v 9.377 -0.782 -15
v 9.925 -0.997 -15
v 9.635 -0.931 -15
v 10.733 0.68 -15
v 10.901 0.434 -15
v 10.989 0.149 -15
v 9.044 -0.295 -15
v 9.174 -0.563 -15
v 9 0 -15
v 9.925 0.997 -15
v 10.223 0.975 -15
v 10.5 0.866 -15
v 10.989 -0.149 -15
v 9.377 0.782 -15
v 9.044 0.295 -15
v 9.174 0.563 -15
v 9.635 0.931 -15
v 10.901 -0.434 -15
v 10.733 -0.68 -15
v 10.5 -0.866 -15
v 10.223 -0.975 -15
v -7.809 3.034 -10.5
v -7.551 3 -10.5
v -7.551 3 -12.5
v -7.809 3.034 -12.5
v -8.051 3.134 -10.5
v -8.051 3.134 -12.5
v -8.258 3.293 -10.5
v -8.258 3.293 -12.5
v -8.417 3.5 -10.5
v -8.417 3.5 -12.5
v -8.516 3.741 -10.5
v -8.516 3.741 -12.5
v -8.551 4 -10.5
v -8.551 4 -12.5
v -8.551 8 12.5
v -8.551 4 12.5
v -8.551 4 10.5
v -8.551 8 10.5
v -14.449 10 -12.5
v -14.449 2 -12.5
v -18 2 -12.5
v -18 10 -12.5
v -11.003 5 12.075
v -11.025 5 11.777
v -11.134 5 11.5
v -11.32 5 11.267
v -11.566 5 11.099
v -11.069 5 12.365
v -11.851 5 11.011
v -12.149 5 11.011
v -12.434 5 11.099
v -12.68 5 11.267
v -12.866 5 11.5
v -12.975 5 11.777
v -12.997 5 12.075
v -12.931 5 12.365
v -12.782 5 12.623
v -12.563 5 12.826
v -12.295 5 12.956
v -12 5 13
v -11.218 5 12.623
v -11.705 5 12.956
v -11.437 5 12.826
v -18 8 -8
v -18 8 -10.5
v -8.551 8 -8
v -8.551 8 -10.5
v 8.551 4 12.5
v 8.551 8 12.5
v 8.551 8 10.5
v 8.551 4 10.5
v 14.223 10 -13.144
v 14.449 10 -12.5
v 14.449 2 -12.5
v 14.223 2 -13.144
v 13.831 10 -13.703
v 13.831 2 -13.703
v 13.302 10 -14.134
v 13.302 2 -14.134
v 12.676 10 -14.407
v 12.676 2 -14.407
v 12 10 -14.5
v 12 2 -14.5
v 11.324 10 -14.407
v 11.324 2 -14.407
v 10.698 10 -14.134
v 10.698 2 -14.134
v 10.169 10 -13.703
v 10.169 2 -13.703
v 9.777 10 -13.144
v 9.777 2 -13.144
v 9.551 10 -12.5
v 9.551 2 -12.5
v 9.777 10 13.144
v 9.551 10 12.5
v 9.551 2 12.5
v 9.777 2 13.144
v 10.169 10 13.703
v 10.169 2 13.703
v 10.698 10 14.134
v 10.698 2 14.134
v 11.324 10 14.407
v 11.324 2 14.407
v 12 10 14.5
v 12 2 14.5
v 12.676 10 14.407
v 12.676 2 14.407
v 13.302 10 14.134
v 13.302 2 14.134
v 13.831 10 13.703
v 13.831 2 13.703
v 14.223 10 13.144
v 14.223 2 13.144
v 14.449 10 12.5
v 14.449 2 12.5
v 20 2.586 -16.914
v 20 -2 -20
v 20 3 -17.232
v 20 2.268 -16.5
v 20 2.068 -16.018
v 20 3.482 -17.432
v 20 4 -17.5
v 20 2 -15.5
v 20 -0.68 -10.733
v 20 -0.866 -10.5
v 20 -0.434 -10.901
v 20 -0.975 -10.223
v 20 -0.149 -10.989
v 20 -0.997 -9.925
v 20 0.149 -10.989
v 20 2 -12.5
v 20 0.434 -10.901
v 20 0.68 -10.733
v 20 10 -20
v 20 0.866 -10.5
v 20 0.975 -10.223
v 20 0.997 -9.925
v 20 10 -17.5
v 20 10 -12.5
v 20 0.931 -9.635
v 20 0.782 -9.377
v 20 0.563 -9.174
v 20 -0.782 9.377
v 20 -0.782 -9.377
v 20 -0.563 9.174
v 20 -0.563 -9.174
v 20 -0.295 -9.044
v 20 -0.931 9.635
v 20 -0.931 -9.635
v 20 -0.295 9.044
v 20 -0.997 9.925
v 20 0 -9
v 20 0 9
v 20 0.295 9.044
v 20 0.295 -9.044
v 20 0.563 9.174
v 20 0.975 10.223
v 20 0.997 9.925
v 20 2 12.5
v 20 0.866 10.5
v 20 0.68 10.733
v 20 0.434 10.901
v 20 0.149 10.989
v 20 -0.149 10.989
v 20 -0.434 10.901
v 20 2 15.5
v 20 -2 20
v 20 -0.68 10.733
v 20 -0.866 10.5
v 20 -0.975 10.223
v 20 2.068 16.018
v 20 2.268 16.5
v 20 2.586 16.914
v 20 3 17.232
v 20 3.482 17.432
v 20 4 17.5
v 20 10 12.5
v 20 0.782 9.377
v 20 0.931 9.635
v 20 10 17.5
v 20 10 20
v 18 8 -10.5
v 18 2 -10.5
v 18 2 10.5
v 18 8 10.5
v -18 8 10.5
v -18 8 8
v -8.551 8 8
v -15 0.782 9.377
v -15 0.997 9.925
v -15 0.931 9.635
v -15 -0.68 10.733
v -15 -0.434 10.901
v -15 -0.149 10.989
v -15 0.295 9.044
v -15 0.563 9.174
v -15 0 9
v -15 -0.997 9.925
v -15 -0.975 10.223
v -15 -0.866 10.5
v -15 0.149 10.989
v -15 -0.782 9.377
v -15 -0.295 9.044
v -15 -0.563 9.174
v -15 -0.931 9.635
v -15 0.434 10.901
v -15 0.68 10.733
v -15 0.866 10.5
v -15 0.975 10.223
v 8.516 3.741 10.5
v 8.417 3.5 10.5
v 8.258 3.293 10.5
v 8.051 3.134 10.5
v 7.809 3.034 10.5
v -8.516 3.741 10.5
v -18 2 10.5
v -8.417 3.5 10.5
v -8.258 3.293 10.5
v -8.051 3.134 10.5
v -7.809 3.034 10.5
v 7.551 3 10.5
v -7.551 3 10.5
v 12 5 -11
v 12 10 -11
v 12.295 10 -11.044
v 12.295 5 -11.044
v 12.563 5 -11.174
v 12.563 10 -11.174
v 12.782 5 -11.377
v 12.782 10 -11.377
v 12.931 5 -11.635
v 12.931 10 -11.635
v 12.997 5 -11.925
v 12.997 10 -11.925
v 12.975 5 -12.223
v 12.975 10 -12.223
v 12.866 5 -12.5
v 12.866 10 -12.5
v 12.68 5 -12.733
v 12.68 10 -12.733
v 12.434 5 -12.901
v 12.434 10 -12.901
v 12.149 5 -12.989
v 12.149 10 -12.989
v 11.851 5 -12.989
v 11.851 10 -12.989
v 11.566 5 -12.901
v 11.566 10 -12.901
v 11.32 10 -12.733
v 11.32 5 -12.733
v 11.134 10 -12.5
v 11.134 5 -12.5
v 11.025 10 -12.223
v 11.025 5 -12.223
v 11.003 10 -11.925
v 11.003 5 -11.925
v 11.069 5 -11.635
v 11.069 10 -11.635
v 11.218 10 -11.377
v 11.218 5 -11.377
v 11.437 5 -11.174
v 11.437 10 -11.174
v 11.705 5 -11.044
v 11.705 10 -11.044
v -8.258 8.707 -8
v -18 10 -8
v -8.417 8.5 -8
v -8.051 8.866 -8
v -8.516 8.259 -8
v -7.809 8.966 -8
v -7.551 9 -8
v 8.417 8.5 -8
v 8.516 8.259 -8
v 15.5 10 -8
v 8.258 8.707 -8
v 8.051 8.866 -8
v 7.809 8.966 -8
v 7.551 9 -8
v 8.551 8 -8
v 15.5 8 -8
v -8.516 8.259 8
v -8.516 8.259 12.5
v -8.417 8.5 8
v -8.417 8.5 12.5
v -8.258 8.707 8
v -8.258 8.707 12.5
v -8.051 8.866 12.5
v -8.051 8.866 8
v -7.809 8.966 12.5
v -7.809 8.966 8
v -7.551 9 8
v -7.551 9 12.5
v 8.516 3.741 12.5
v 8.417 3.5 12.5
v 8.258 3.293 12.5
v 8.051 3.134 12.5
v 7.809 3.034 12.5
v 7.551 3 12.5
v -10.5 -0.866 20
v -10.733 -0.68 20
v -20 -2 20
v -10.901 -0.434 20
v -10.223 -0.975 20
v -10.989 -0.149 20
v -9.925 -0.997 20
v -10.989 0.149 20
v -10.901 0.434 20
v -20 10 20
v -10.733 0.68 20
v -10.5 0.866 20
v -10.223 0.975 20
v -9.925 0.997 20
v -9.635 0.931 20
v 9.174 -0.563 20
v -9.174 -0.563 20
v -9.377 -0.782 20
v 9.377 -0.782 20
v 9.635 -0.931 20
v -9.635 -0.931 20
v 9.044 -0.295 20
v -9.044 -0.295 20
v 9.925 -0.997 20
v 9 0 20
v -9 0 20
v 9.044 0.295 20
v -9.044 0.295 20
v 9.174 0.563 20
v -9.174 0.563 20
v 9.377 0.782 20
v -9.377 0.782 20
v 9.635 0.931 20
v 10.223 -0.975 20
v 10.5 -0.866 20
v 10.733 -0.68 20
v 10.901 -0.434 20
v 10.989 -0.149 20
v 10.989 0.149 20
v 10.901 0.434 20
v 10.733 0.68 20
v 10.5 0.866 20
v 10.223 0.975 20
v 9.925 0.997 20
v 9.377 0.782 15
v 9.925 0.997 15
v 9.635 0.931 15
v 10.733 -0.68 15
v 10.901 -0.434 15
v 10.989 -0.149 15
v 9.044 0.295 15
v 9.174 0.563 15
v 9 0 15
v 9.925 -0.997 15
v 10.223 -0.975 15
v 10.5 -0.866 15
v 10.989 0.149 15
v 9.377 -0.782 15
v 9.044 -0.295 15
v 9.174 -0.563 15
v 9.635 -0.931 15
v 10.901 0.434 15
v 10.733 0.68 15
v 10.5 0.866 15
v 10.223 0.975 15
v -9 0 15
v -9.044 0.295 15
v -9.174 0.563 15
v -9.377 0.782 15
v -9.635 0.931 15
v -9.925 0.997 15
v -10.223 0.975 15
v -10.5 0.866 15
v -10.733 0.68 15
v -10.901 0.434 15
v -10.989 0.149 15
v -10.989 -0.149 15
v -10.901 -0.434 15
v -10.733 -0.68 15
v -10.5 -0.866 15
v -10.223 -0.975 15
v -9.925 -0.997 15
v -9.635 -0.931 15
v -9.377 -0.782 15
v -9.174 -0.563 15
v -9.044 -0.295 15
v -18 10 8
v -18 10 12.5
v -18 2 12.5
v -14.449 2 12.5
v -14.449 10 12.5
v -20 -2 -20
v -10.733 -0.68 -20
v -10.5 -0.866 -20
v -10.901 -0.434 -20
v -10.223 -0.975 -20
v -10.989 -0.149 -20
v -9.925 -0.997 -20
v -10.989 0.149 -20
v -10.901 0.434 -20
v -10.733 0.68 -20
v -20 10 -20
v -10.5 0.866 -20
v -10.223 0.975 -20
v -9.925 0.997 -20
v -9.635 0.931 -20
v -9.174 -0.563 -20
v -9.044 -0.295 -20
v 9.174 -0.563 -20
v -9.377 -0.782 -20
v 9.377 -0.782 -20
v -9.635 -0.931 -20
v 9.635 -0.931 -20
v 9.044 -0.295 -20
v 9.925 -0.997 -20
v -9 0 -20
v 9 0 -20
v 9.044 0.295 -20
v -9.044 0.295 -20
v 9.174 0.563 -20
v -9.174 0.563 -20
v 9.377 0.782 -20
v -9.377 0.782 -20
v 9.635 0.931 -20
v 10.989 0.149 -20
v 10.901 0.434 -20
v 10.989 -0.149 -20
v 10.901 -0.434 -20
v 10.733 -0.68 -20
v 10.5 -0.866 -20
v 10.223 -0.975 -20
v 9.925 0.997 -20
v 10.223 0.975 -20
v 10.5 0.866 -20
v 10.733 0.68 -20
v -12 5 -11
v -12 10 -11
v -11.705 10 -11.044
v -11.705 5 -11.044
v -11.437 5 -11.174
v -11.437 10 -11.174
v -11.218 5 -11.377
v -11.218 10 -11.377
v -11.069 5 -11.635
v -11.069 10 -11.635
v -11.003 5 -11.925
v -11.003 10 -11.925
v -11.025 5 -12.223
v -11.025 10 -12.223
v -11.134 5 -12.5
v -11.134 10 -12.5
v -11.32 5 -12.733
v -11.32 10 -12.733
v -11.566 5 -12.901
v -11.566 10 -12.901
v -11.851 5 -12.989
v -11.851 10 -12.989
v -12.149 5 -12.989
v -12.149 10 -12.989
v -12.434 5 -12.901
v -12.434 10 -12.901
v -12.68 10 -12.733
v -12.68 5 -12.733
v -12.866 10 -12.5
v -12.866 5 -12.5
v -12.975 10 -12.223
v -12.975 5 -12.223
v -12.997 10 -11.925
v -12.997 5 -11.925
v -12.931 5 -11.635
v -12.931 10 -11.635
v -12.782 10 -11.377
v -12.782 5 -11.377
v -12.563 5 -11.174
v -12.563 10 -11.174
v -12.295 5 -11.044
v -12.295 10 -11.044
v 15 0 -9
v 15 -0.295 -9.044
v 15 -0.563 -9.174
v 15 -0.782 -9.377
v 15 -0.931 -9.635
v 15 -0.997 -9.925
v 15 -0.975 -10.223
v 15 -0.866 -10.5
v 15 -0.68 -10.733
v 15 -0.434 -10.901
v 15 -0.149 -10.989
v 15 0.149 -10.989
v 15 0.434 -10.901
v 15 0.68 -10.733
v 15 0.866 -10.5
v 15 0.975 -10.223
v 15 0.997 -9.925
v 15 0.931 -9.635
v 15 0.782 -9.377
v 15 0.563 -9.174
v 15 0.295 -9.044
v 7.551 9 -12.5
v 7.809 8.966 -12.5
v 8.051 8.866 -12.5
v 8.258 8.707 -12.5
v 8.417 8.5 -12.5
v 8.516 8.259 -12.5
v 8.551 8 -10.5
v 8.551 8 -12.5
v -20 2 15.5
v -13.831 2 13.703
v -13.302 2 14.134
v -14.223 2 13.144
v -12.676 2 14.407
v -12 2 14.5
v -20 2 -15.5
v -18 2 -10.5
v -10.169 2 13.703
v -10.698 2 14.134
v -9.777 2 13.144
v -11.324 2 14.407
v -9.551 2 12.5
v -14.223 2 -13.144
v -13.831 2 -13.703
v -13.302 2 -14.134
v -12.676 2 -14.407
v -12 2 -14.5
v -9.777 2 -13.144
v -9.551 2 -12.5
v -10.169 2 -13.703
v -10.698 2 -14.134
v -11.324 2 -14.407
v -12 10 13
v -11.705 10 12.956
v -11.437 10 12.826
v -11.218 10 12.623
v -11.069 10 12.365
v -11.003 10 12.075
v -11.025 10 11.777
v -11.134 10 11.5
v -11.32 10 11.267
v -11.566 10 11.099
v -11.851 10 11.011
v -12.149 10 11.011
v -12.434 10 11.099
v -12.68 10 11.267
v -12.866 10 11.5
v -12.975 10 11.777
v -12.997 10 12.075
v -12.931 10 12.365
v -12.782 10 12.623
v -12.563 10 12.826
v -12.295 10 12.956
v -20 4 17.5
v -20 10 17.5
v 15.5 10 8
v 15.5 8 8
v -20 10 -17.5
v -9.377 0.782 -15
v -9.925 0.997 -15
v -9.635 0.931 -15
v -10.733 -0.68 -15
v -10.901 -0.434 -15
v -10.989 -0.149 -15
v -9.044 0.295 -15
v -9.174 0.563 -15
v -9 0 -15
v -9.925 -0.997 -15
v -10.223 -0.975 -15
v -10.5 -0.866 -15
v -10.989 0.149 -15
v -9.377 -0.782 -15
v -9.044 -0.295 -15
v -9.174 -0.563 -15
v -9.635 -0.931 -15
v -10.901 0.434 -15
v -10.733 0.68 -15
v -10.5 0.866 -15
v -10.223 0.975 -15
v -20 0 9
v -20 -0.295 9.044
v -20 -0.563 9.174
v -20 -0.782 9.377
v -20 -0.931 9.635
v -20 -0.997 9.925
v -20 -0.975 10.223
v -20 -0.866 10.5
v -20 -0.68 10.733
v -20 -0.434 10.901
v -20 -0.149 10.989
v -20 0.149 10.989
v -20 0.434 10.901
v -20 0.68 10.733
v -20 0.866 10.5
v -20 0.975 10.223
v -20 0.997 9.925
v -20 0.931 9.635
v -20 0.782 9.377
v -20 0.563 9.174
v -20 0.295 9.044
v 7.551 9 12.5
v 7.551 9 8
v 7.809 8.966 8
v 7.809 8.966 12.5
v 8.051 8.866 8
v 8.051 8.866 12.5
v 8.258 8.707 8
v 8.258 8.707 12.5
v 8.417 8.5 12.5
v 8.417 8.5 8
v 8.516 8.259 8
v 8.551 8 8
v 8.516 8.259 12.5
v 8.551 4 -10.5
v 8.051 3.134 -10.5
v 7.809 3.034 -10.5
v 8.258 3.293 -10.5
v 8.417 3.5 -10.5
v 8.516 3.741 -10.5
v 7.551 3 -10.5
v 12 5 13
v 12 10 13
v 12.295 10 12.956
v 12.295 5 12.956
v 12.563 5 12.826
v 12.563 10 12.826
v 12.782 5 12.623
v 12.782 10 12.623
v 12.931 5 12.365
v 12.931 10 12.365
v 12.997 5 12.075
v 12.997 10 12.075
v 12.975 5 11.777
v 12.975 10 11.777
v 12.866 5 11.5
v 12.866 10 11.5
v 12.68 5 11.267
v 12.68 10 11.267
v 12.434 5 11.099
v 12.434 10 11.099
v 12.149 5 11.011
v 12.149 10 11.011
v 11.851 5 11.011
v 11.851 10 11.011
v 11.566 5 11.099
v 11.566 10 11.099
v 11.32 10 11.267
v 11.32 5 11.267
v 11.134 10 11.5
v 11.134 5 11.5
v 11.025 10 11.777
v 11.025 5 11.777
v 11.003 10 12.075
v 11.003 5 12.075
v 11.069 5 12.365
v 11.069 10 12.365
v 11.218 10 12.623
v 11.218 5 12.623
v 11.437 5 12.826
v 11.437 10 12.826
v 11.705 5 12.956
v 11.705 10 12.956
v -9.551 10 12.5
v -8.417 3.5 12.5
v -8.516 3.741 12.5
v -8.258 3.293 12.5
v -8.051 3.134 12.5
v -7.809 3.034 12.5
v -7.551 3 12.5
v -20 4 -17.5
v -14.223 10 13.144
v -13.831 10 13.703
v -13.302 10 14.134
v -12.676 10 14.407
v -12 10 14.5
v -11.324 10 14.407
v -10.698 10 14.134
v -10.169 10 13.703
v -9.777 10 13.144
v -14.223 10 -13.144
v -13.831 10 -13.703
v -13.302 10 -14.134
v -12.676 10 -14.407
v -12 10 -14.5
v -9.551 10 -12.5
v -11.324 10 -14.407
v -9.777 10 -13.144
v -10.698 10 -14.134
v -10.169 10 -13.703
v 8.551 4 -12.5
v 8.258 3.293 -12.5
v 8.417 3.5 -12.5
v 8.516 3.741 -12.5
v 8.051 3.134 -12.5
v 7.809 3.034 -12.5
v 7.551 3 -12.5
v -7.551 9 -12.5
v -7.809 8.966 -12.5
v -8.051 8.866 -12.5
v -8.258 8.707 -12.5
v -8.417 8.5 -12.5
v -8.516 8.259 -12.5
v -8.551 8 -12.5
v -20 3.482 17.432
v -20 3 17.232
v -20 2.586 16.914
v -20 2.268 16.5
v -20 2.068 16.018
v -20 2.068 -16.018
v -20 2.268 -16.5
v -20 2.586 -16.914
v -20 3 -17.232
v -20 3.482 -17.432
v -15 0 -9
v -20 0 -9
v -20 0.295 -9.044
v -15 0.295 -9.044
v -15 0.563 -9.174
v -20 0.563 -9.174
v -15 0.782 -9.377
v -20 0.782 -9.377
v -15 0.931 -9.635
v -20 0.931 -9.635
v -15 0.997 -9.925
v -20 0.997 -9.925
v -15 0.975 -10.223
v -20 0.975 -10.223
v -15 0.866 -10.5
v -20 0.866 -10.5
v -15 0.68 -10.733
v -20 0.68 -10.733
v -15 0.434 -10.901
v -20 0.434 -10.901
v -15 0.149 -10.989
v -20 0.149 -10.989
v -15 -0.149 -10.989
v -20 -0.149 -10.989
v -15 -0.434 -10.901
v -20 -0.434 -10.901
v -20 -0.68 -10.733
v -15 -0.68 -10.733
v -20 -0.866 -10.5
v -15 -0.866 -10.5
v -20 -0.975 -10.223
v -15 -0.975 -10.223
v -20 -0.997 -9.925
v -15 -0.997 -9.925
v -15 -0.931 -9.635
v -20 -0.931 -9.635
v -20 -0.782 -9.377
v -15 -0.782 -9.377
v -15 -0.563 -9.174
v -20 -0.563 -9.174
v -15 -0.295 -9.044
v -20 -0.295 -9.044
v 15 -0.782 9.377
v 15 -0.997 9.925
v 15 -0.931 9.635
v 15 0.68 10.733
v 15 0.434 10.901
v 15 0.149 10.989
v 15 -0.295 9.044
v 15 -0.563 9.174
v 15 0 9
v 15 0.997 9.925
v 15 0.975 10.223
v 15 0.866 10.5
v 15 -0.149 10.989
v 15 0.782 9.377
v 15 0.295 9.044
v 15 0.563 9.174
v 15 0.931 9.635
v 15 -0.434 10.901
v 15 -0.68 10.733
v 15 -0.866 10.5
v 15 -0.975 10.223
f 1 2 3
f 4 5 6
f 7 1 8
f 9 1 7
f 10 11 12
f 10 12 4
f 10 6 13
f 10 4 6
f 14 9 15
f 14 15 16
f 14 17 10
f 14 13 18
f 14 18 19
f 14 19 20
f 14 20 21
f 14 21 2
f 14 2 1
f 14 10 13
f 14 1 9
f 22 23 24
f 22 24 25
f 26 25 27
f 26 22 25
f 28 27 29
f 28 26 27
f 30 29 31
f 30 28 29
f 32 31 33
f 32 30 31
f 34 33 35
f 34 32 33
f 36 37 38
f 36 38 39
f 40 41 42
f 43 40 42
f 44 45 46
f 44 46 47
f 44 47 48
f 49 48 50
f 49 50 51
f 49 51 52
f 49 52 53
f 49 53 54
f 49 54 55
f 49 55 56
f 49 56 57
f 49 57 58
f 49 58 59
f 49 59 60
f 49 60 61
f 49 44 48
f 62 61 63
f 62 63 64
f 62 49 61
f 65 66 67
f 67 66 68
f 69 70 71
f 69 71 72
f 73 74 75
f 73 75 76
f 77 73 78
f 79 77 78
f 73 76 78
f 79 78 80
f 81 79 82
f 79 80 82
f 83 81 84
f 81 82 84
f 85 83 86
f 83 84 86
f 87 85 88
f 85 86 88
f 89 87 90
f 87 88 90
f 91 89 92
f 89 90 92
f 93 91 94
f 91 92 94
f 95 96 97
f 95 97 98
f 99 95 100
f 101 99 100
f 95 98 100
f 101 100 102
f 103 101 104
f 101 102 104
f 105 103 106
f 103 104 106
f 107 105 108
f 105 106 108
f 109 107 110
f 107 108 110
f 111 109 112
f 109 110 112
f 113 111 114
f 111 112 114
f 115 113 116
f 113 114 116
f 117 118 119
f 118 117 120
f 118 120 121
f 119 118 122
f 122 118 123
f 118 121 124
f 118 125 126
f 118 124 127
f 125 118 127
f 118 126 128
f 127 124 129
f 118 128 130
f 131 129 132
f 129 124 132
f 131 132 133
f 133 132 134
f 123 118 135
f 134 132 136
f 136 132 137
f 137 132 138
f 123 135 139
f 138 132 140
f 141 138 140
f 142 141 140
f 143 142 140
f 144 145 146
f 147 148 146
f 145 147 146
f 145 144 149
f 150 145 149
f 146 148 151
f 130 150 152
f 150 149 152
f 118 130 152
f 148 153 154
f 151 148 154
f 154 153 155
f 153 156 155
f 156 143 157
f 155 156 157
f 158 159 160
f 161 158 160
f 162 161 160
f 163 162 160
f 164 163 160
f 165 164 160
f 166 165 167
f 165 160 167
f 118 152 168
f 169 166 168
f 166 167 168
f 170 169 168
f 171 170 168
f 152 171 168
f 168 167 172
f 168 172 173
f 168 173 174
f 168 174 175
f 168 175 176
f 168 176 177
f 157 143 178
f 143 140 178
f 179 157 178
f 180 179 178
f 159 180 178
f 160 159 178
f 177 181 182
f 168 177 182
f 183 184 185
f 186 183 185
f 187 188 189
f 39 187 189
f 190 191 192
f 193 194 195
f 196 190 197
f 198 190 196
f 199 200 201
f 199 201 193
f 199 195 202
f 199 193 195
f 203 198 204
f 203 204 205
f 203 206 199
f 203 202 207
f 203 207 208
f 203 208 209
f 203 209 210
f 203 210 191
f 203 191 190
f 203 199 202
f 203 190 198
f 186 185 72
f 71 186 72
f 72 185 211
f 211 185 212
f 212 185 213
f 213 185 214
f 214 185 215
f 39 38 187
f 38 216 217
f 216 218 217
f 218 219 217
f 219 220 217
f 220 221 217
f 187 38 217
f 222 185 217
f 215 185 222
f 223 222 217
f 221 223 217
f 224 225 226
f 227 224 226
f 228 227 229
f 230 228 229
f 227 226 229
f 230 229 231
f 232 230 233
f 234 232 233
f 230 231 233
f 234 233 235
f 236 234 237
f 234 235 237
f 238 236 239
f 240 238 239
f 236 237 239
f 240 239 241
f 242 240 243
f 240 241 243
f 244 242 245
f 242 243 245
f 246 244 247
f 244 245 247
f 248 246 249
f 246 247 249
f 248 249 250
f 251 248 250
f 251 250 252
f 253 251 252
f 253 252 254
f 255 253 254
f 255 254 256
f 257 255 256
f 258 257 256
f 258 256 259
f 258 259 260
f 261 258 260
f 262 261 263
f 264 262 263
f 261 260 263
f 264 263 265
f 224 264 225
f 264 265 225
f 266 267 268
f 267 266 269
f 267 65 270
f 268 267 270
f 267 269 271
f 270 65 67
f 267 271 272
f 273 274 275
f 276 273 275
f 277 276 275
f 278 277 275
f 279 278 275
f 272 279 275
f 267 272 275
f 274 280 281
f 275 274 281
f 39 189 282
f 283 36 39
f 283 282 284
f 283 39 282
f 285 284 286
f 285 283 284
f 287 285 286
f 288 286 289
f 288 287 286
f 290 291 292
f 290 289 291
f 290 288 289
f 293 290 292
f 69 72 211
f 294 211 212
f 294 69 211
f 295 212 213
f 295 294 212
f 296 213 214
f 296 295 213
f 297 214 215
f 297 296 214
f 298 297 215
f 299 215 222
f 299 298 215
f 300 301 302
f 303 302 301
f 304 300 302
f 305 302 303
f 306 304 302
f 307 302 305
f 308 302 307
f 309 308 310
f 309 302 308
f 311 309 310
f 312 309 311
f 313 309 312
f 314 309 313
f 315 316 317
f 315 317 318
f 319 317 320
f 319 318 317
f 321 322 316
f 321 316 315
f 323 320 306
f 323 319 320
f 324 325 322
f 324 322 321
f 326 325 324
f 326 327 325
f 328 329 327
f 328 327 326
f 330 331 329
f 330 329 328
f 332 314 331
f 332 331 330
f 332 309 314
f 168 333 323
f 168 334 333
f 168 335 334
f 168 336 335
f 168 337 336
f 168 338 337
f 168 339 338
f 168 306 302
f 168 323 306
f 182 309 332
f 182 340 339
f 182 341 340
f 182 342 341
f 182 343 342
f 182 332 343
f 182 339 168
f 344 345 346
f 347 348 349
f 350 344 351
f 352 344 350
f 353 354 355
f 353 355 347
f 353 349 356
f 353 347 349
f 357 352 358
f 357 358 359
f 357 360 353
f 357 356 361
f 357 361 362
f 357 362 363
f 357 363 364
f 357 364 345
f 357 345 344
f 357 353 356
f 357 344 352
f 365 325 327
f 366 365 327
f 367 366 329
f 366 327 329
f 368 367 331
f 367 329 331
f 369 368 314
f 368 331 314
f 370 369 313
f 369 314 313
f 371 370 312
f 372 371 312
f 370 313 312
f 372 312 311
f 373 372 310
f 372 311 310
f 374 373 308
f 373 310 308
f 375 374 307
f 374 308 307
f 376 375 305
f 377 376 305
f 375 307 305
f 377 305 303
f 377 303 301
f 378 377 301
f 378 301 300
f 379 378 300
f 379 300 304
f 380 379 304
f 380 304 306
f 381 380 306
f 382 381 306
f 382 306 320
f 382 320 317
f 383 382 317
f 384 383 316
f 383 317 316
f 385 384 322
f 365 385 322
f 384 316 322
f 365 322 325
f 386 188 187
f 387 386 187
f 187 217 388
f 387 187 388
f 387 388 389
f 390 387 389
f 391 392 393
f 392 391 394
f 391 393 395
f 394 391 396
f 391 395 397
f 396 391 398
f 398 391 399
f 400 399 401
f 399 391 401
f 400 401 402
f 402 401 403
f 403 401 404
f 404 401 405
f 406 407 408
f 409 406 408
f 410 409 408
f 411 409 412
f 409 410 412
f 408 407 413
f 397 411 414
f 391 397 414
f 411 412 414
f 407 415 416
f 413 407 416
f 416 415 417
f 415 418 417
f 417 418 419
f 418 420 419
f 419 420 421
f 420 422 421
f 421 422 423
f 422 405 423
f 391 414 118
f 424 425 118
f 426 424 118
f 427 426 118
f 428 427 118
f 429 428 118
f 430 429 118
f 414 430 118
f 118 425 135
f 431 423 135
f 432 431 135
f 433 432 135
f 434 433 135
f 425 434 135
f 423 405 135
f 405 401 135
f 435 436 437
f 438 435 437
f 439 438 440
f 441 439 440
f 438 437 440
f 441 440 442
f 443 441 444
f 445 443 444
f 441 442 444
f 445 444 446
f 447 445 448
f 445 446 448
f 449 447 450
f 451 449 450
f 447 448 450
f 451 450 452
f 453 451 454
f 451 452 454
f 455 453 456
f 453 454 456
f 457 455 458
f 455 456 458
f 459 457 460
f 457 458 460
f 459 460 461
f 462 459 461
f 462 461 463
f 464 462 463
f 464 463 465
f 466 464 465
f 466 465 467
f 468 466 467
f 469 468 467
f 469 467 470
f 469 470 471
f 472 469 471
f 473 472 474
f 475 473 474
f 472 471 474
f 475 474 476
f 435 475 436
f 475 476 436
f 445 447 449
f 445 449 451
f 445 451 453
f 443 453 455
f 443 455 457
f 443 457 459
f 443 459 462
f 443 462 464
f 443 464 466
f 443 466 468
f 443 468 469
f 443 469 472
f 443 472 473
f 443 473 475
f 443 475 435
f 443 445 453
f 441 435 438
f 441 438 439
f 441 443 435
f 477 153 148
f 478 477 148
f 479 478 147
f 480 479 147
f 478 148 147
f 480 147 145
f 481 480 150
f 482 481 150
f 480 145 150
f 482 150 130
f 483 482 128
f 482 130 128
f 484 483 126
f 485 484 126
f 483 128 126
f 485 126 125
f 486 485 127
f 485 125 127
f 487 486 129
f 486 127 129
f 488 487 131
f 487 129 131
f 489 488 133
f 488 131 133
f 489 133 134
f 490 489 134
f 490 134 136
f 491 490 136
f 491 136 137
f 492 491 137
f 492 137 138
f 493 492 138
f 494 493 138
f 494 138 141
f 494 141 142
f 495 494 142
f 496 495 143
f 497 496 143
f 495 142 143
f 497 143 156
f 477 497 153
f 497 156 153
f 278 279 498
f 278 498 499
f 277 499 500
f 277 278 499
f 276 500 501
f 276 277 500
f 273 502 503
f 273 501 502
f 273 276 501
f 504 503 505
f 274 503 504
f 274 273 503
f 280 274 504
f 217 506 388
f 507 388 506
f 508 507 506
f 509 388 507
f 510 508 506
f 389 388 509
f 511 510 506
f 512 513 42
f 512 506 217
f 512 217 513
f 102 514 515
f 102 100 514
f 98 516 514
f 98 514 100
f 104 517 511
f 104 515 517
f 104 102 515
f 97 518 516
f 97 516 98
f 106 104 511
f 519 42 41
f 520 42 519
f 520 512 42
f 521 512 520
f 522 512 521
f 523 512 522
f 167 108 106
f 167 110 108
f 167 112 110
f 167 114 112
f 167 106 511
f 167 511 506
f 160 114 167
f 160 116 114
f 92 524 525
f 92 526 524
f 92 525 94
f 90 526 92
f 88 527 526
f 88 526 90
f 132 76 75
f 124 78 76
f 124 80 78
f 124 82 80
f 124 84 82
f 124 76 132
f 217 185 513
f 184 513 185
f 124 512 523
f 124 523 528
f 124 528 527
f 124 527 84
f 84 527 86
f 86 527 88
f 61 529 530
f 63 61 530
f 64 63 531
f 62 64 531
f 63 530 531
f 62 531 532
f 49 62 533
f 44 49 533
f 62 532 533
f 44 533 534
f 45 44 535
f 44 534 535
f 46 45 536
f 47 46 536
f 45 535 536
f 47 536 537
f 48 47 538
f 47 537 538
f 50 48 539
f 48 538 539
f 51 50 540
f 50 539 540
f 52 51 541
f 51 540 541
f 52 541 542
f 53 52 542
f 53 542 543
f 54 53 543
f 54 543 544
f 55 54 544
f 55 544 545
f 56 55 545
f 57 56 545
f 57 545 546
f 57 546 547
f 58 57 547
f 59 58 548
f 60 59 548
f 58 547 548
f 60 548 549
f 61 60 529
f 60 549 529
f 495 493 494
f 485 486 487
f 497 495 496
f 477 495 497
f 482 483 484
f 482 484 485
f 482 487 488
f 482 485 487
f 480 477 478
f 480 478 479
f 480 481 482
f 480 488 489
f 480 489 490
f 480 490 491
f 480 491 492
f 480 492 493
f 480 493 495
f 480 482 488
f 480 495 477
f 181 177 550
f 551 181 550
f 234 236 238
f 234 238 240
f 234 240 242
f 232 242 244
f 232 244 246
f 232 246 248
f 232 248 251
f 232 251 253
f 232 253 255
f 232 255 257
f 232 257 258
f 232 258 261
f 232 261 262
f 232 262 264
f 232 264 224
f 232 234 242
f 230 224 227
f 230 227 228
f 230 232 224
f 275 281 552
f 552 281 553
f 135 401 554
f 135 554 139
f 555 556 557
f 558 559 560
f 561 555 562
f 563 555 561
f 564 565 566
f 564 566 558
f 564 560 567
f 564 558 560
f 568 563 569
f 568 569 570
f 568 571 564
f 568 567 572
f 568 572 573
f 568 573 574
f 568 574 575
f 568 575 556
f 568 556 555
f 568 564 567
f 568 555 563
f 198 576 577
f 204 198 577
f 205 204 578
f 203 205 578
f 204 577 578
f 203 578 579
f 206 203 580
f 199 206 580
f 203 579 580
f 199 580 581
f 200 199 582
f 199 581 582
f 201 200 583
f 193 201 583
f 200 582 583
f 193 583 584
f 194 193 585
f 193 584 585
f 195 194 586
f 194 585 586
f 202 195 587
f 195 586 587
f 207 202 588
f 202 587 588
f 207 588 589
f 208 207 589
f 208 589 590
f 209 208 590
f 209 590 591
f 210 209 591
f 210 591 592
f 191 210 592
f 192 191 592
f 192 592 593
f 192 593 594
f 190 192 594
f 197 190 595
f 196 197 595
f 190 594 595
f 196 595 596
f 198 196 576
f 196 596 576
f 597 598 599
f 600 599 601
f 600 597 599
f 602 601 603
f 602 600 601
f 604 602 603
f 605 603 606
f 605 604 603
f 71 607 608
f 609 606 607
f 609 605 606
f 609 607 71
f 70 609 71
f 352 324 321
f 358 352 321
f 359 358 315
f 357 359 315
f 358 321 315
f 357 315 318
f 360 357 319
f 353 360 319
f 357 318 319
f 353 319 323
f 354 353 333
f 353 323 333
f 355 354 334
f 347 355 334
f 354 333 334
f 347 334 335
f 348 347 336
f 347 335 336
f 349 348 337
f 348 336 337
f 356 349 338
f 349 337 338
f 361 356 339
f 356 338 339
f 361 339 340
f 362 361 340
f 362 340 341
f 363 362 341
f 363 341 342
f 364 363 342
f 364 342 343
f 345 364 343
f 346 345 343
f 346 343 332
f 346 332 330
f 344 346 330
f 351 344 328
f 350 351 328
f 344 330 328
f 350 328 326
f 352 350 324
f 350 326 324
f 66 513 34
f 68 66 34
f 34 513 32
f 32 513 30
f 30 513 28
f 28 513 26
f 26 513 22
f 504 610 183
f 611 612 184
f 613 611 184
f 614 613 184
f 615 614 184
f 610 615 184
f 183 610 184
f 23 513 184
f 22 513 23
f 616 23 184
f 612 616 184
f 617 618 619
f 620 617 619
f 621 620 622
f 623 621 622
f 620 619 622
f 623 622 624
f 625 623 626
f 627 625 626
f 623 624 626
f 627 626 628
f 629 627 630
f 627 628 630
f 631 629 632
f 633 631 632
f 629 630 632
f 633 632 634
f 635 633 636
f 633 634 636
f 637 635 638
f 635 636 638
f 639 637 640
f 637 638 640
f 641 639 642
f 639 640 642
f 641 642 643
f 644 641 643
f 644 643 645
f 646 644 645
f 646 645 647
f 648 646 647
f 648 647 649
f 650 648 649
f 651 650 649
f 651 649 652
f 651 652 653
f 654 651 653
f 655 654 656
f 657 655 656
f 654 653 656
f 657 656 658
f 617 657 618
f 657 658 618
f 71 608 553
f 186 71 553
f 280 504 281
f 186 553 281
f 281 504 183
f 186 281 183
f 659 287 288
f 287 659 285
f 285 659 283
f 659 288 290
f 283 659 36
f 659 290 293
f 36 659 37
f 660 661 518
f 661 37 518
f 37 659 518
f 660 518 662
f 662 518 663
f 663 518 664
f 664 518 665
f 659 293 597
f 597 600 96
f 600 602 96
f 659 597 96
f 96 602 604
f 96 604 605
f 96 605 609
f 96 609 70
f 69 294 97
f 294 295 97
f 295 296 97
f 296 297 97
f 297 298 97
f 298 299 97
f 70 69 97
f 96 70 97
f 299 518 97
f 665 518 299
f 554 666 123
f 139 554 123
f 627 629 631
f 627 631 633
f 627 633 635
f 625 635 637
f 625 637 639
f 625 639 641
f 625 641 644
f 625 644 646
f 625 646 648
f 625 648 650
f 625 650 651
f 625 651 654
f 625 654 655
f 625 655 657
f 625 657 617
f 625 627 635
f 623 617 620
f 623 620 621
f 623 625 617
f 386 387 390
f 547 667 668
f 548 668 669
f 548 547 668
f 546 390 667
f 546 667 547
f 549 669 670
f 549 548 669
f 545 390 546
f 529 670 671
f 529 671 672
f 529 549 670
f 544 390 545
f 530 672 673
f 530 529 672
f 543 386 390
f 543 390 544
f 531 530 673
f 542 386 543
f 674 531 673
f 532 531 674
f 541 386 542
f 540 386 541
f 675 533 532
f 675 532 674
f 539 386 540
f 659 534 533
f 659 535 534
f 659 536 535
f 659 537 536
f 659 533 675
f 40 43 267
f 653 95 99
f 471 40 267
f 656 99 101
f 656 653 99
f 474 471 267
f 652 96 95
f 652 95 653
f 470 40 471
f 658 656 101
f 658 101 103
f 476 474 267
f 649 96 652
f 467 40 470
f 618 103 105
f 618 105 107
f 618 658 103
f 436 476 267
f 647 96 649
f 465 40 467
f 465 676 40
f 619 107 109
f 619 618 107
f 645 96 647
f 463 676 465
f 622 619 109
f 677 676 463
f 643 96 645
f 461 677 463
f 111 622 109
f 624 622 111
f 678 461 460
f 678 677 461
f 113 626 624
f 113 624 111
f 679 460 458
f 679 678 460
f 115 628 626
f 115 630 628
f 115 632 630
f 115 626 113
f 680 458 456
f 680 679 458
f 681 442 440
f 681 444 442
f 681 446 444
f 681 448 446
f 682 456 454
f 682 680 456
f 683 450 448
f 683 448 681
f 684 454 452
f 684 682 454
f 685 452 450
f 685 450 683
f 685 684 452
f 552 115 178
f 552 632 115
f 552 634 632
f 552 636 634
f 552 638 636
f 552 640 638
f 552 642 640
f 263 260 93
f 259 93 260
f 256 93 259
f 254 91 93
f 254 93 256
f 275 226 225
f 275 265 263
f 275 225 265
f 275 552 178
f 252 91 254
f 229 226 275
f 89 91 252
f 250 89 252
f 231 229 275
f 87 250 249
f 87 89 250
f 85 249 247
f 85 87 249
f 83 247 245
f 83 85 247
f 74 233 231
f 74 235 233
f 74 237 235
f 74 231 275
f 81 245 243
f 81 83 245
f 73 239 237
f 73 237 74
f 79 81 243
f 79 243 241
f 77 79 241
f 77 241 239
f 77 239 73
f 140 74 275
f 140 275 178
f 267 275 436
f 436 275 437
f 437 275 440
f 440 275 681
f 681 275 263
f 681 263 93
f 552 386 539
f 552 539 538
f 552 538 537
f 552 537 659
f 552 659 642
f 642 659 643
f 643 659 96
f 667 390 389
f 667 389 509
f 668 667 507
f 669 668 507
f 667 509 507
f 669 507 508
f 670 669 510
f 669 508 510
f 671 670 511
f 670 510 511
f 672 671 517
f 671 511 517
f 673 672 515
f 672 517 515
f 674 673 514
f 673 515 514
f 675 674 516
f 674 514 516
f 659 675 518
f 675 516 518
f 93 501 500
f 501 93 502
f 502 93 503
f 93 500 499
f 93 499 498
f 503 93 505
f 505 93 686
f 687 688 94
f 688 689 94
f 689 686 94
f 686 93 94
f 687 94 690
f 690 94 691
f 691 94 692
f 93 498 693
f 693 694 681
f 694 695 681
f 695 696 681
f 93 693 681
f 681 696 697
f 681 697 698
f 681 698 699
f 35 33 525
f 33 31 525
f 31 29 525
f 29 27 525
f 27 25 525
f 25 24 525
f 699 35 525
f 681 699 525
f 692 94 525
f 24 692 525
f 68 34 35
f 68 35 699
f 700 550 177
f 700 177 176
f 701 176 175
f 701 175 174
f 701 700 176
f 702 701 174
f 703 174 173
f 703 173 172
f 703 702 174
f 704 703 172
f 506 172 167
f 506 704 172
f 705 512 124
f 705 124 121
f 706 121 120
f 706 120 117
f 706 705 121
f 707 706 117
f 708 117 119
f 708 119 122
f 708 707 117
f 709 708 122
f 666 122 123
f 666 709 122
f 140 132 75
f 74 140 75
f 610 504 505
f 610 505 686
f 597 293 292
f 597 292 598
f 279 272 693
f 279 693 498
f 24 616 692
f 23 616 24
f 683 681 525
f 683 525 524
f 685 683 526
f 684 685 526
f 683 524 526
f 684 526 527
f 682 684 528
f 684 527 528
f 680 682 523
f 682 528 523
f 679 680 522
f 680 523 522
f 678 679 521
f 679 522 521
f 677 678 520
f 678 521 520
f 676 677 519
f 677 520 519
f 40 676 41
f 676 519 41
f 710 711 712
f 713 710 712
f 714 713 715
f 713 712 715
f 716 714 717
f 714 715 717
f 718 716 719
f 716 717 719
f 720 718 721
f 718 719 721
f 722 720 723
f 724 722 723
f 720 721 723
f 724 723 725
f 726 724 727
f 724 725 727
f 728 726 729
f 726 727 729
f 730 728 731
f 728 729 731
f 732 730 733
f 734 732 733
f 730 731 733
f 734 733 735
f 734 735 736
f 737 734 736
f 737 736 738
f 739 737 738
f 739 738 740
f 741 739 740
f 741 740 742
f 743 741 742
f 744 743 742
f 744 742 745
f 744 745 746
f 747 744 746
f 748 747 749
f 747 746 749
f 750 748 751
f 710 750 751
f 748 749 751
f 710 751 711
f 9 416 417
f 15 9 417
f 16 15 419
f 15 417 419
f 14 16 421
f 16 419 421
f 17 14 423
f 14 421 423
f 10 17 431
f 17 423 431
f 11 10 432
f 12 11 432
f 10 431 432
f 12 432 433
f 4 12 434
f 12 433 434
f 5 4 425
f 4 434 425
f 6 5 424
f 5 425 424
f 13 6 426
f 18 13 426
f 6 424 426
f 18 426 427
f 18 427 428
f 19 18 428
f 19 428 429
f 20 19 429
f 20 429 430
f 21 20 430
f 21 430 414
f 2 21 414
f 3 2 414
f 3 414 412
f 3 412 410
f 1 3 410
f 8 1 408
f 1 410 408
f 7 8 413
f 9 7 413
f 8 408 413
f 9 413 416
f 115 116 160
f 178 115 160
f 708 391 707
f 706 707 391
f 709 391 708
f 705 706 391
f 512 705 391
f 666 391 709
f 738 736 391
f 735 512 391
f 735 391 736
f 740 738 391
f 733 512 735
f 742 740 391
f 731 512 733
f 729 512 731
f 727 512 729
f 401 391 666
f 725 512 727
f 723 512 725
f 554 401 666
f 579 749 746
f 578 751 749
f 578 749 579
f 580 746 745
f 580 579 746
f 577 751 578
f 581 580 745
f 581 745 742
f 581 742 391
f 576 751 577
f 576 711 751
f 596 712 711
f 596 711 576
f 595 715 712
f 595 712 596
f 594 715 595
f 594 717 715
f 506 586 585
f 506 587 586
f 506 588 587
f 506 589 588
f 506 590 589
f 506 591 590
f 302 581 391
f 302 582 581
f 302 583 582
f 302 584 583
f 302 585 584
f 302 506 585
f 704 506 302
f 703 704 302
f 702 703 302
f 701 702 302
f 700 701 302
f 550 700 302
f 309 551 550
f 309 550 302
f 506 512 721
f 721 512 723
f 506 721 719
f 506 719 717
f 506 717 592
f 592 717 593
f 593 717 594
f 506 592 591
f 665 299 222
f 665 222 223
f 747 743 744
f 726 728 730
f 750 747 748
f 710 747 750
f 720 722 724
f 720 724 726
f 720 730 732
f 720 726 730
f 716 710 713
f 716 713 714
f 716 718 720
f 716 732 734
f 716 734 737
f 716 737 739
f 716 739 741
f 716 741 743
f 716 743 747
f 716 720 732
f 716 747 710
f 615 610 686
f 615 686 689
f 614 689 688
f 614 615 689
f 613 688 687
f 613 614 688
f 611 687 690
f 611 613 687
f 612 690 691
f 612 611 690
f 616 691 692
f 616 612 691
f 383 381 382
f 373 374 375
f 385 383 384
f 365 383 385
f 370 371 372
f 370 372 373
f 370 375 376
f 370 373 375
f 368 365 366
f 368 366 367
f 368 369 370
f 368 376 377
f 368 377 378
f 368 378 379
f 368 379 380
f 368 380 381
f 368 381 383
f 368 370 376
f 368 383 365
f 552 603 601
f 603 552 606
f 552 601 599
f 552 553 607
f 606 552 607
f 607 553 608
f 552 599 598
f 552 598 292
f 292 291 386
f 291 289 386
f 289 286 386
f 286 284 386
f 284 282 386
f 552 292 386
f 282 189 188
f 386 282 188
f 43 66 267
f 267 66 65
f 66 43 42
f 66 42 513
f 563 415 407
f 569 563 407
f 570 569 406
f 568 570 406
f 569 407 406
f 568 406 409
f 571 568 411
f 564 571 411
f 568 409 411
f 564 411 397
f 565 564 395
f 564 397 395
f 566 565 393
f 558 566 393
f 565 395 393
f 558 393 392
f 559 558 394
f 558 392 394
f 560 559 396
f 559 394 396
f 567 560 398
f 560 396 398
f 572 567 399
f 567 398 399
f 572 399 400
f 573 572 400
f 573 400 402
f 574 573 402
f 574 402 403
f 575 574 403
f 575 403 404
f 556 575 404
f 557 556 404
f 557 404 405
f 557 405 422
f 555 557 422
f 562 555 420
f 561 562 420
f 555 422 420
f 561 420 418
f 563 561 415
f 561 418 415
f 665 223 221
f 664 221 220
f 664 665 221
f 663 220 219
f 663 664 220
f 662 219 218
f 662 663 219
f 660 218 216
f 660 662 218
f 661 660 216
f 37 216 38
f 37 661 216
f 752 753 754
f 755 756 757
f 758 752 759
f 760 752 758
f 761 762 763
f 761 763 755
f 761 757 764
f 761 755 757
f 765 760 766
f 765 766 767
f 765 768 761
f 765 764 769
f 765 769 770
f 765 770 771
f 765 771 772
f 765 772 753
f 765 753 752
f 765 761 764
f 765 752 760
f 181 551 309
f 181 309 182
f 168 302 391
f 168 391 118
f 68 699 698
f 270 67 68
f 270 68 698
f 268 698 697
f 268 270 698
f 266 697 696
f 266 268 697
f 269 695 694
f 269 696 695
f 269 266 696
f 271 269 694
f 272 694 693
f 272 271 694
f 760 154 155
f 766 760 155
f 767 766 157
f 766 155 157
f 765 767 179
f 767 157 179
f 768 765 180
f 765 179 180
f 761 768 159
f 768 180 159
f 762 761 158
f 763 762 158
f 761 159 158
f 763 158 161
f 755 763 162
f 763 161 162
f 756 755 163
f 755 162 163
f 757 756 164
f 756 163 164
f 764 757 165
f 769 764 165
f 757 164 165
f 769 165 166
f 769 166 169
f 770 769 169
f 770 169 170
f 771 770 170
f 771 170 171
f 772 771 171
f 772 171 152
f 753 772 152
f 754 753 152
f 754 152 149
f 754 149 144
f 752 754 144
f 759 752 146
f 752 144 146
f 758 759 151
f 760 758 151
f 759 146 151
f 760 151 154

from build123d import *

# Parameters (mm, degrees)
SKETCH1_W            = 40
SKETCH1_H            = 40
BOSS_EXTRUDE3_DEPTH  = 2
BOSS_EXTRUDE4_DEPTH  = 6
BOSS_EXTRUDE5_DEPTH  = 2
BOSS_EXTRUDE6_START  = -6
BOSS_EXTRUDE6_DEPTH  = 6
BOSS_EXTRUDE7_DEPTH  = 2
SKETCH7_R            = 1
CUT_EXTRUDE1_DEPTH   = 5
CUT_EXTRUDE2_DEPTH   = 34
BOSS_EXTRUDE8_DEPTH  = 8
BOSS_EXTRUDE9_DEPTH  = 40
SKETCH11_W           = 40
SKETCH11_H           = 40
BOSS_EXTRUDE10_DEPTH = 2
SKETCH13_R           = 1
CUT_EXTRUDE3_DEPTH   = 5
CIRPATTERN1_COUNT    = 4


with BuildPart() as part:
    # Sketch1 → Boss-Extrude3 (new body)
    with BuildSketch(Plane(origin=(0, 0, 0), x_dir=(1, 0, 0), z_dir=(0, 1, 0))):
        Rectangle(SKETCH1_W, SKETCH1_H)
    extrude(amount=BOSS_EXTRUDE3_DEPTH)

    # Sketch5 → Boss-Extrude4 (add)
    with BuildSketch(Plane(origin=(0, 2, 0), x_dir=(1, 0, 0), z_dir=(0, 1, 0))):
        Polygon((18, -10.5), (-18, -10.5), (-18, -12.5), (20, -12.5), (20, 12.5), (-18, 12.5), (-18, 10.5), (18, 10.5), align=None)
    extrude(amount=BOSS_EXTRUDE4_DEPTH)

    # Sketch6 → Boss-Extrude5 (add)
    with BuildSketch(Plane(origin=(0, 8, 0), x_dir=(1, 0, 0), z_dir=(0, 1, 0))):
        with BuildLine():
            ThreePointArc((14, -10.5), (12, -9.5), (10, -10.5))
            Line((10, -10.5), (-10, -10.5))
            ThreePointArc((-10, -10.5), (-12, -9.5), (-14, -10.5))
            Line((-14, -10.5), (-18, -10.5))
            Line((-18, -10.5), (-18, -12.5))
            Line((-18, -12.5), (-14.449489743, -12.5))
            ThreePointArc((-14.449489743, -12.5), (-12, -14.5), (-9.550510257, -12.5))
            Line((-9.550510257, -12.5), (9.550510257, -12.5))
            ThreePointArc((9.550510257, -12.5), (12, -14.5), (14.449489743, -12.5))
            Line((14.449489743, -12.5), (20, -12.5))
            Line((20, -12.5), (20, 12.5))
            Line((20, 12.5), (14.449489743, 12.5))
            ThreePointArc((14.449489743, 12.5), (12, 14.5), (9.550510257, 12.5))
            Line((9.550510257, 12.5), (-9.550510257, 12.5))
            ThreePointArc((-9.550510257, 12.5), (-12, 14.5), (-14.449489743, 12.5))
            Line((-14.449489743, 12.5), (-18, 12.5))
            Line((-18, 12.5), (-18, 10.5))
            Line((-18, 10.5), (-14, 10.5))
            ThreePointArc((-14, 10.5), (-12, 9.5), (-10, 10.5))
            Line((-10, 10.5), (10, 10.5))
            ThreePointArc((10, 10.5), (12, 9.5), (14, 10.5))
            Line((14, 10.5), (18, 10.5))
            Line((18, 10.5), (18, -10.5))
            Line((18, -10.5), (14, -10.5))
        make_face()
    extrude(amount=BOSS_EXTRUDE5_DEPTH)

    # Sketch6<3> → Boss-Extrude6 (add)
    with BuildSketch(Plane(origin=(0, 8, 0), x_dir=(1, 0, 0), z_dir=(0, 1, 0)).offset(BOSS_EXTRUDE6_START)):
        with BuildLine():
            ThreePointArc((-9.550510257, 12.5), (-12, 14.5), (-14.449489743, 12.5))
            Line((-14.449489743, 12.5), (-9.550510257, 12.5))
        make_face()
        with BuildLine():
            ThreePointArc((14.449489743, 12.5), (12, 14.5), (9.550510257, 12.5))
            Line((9.550510257, 12.5), (14.449489743, 12.5))
        make_face()
        with BuildLine():
            Line((-9.550510257, -12.5), (-14.449489743, -12.5))
            ThreePointArc((-14.449489743, -12.5), (-12, -14.5), (-9.550510257, -12.5))
        make_face()
        with BuildLine():
            ThreePointArc((9.550510257, -12.5), (12, -14.5), (14.449489743, -12.5))
            Line((14.449489743, -12.5), (9.550510257, -12.5))
        make_face()
    extrude(amount=BOSS_EXTRUDE6_DEPTH)

    # Sketch6<4> → Boss-Extrude7 (add)
    with BuildSketch(Plane(origin=(0, 8, 0), x_dir=(1, 0, 0), z_dir=(0, 1, 0))):
        with BuildLine():
            Line((-15.5, -8), (-18, -8))
            Line((-18, -8), (-18, -10.5))
            Line((-18, -10.5), (-14, -10.5))
            ThreePointArc((-14, -10.5), (-13.118033989, -9.763932023), (-12, -9.5))
            Line((-12, -9.5), (-12, -8))
            Line((-12, -8), (-15.5, -8))
        make_face()
        with BuildLine():
            Line((12, -8), (-12, -8))
            Line((-12, -8), (-12, -9.5))
            ThreePointArc((-12, -9.5), (-10.881966011, -9.763932023), (-10, -10.5))
            Line((-10, -10.5), (10, -10.5))
            ThreePointArc((10, -10.5), (10.881966011, -9.763932023), (12, -9.5))
            Line((12, -9.5), (12, -8))
        make_face()
        with BuildLine():
            Line((12, 9.5), (12, 8))
            Line((12, 8), (15.5, 8))
            Line((15.5, 8), (15.5, -8))
            Line((15.5, -8), (12, -8))
            Line((12, -8), (12, -9.5))
            ThreePointArc((12, -9.5), (13.118033989, -9.763932023), (14, -10.5))
            Line((14, -10.5), (18, -10.5))
            Line((18, -10.5), (18, 10.5))
            Line((18, 10.5), (14, 10.5))
            ThreePointArc((14, 10.5), (13.118033989, 9.763932023), (12, 9.5))
        make_face()
        with BuildLine():
            ThreePointArc((-10, 10.5), (-10.881966011, 9.763932023), (-12, 9.5))
            Line((-12, 9.5), (-12, 8))
            Line((-12, 8), (12, 8))
            Line((12, 8), (12, 9.5))
            ThreePointArc((12, 9.5), (10.881966011, 9.763932023), (10, 10.5))
            Line((10, 10.5), (-10, 10.5))
        make_face()
        with BuildLine():
            Line((-14, 10.5), (-18, 10.5))
            Line((-18, 10.5), (-18, 8))
            Line((-18, 8), (-15.5, 8))
            Line((-15.5, 8), (-12, 8))
            Line((-12, 8), (-12, 9.5))
            ThreePointArc((-12, 9.5), (-13.118033989, 9.763932023), (-14, 10.5))
        make_face()
    extrude(amount=BOSS_EXTRUDE7_DEPTH)

    # Sketch7 → Cut-Extrude1 (cut)
    with BuildSketch(Plane(origin=(0, 10, 0), x_dir=(1, 0, 0), z_dir=(0, 1, 0))):
        with Locations(Location((-12, 12, 0), (0, 0, 270))):
            Circle(SKETCH7_R)
        with Locations(Location((12, 12, 0), (0, 0, 270))):
            Circle(SKETCH7_R)
        with Locations(Location((12, -12, 0), (0, 0, 270))):
            Circle(SKETCH7_R)
        with Locations(Location((-12, -12, 0), (0, 0, 270))):
            Circle(SKETCH7_R)
    extrude(amount=-CUT_EXTRUDE1_DEPTH, mode=Mode.SUBTRACT)

    # Sketch8 → Cut-Extrude2 (cut)
    with BuildSketch(Plane.XY.offset(12.5)):
        with BuildLine():
            ThreePointArc((-8.550510257, 8), (-8.257617038, 8.707106781), (-7.550510257, 9))
            Line((-7.550510257, 9), (7.550510257, 9))
            ThreePointArc((7.550510257, 9), (8.257617038, 8.707106781), (8.550510257, 8))
            Line((8.550510257, 8), (8.550510257, 4))
            ThreePointArc((8.550510257, 4), (8.257617038, 3.292893219), (7.550510257, 3))
            Line((7.550510257, 3), (-7.550510257, 3))
            ThreePointArc((-7.550510257, 3), (-8.257617038, 3.292893219), (-8.550510257, 4))
            Line((-8.550510257, 4), (-8.550510257, 8))
        make_face()
    extrude(amount=-CUT_EXTRUDE2_DEPTH, mode=Mode.SUBTRACT)

    # Sketch9 → Boss-Extrude8 (add)
    with BuildSketch(Plane(origin=(0, 2, 0), x_dir=(1, 0, 0), z_dir=(0, 1, 0))):
        Polygon((-20, 20), (-20, 17.5), (-17.5, 17.5), (17.5, 17.5), (20, 17.5), (20, 20), align=None)
        Polygon((-17.5, -17.5), (-20, -17.5), (-20, -20), (20, -20), (20, -17.5), (17.5, -17.5), align=None)
    extrude(amount=BOSS_EXTRUDE8_DEPTH)

    # Sketch10 → Boss-Extrude9 (add)
    with BuildSketch(Plane.ZY.offset(20)):
        with BuildLine():
            Line((-17.5, 2), (-15.5, 2))
            ThreePointArc((-15.5, 2), (-16.914213562, 2.585786438), (-17.5, 4))
            Line((-17.5, 4), (-17.5, 2))
        make_face()
        with BuildLine():
            ThreePointArc((17.5, 4), (16.914213562, 2.585786438), (15.5, 2))
            Line((15.5, 2), (17.5, 2))
            Line((17.5, 2), (17.5, 4))
        make_face()
    extrude(amount=-BOSS_EXTRUDE9_DEPTH)

    # Sketch11 → Boss-Extrude10 (add)
    with BuildSketch(Plane.XZ):
        Rectangle(SKETCH11_W, SKETCH11_H)
    extrude(amount=BOSS_EXTRUDE10_DEPTH)

    # Sketch13 → Cut-Extrude3 (cut)
    with BuildSketch(Plane(origin=(20, 0, 0), x_dir=(0, 0, -1), z_dir=(1, 0, 0))):
        with Locations((-10, 0)):
            Circle(SKETCH13_R)
        with Locations(Location((10, 0, 0), (0, 0, 180))):
            Circle(SKETCH13_R)
    cut_extrude3 = extrude(amount=-CUT_EXTRUDE3_DEPTH, mode=Mode.SUBTRACT)

    # CirPattern1: Cut-Extrude3 ×4 about axis
    cirpattern1_axis = Axis((0, 0, 0), (0, 1, 0))
    for i in range(1, CIRPATTERN1_COUNT):
        add(cut_extrude3.rotate(cirpattern1_axis, i * 360 / CIRPATTERN1_COUNT), mode=Mode.SUBTRACT)


solid = part.part
